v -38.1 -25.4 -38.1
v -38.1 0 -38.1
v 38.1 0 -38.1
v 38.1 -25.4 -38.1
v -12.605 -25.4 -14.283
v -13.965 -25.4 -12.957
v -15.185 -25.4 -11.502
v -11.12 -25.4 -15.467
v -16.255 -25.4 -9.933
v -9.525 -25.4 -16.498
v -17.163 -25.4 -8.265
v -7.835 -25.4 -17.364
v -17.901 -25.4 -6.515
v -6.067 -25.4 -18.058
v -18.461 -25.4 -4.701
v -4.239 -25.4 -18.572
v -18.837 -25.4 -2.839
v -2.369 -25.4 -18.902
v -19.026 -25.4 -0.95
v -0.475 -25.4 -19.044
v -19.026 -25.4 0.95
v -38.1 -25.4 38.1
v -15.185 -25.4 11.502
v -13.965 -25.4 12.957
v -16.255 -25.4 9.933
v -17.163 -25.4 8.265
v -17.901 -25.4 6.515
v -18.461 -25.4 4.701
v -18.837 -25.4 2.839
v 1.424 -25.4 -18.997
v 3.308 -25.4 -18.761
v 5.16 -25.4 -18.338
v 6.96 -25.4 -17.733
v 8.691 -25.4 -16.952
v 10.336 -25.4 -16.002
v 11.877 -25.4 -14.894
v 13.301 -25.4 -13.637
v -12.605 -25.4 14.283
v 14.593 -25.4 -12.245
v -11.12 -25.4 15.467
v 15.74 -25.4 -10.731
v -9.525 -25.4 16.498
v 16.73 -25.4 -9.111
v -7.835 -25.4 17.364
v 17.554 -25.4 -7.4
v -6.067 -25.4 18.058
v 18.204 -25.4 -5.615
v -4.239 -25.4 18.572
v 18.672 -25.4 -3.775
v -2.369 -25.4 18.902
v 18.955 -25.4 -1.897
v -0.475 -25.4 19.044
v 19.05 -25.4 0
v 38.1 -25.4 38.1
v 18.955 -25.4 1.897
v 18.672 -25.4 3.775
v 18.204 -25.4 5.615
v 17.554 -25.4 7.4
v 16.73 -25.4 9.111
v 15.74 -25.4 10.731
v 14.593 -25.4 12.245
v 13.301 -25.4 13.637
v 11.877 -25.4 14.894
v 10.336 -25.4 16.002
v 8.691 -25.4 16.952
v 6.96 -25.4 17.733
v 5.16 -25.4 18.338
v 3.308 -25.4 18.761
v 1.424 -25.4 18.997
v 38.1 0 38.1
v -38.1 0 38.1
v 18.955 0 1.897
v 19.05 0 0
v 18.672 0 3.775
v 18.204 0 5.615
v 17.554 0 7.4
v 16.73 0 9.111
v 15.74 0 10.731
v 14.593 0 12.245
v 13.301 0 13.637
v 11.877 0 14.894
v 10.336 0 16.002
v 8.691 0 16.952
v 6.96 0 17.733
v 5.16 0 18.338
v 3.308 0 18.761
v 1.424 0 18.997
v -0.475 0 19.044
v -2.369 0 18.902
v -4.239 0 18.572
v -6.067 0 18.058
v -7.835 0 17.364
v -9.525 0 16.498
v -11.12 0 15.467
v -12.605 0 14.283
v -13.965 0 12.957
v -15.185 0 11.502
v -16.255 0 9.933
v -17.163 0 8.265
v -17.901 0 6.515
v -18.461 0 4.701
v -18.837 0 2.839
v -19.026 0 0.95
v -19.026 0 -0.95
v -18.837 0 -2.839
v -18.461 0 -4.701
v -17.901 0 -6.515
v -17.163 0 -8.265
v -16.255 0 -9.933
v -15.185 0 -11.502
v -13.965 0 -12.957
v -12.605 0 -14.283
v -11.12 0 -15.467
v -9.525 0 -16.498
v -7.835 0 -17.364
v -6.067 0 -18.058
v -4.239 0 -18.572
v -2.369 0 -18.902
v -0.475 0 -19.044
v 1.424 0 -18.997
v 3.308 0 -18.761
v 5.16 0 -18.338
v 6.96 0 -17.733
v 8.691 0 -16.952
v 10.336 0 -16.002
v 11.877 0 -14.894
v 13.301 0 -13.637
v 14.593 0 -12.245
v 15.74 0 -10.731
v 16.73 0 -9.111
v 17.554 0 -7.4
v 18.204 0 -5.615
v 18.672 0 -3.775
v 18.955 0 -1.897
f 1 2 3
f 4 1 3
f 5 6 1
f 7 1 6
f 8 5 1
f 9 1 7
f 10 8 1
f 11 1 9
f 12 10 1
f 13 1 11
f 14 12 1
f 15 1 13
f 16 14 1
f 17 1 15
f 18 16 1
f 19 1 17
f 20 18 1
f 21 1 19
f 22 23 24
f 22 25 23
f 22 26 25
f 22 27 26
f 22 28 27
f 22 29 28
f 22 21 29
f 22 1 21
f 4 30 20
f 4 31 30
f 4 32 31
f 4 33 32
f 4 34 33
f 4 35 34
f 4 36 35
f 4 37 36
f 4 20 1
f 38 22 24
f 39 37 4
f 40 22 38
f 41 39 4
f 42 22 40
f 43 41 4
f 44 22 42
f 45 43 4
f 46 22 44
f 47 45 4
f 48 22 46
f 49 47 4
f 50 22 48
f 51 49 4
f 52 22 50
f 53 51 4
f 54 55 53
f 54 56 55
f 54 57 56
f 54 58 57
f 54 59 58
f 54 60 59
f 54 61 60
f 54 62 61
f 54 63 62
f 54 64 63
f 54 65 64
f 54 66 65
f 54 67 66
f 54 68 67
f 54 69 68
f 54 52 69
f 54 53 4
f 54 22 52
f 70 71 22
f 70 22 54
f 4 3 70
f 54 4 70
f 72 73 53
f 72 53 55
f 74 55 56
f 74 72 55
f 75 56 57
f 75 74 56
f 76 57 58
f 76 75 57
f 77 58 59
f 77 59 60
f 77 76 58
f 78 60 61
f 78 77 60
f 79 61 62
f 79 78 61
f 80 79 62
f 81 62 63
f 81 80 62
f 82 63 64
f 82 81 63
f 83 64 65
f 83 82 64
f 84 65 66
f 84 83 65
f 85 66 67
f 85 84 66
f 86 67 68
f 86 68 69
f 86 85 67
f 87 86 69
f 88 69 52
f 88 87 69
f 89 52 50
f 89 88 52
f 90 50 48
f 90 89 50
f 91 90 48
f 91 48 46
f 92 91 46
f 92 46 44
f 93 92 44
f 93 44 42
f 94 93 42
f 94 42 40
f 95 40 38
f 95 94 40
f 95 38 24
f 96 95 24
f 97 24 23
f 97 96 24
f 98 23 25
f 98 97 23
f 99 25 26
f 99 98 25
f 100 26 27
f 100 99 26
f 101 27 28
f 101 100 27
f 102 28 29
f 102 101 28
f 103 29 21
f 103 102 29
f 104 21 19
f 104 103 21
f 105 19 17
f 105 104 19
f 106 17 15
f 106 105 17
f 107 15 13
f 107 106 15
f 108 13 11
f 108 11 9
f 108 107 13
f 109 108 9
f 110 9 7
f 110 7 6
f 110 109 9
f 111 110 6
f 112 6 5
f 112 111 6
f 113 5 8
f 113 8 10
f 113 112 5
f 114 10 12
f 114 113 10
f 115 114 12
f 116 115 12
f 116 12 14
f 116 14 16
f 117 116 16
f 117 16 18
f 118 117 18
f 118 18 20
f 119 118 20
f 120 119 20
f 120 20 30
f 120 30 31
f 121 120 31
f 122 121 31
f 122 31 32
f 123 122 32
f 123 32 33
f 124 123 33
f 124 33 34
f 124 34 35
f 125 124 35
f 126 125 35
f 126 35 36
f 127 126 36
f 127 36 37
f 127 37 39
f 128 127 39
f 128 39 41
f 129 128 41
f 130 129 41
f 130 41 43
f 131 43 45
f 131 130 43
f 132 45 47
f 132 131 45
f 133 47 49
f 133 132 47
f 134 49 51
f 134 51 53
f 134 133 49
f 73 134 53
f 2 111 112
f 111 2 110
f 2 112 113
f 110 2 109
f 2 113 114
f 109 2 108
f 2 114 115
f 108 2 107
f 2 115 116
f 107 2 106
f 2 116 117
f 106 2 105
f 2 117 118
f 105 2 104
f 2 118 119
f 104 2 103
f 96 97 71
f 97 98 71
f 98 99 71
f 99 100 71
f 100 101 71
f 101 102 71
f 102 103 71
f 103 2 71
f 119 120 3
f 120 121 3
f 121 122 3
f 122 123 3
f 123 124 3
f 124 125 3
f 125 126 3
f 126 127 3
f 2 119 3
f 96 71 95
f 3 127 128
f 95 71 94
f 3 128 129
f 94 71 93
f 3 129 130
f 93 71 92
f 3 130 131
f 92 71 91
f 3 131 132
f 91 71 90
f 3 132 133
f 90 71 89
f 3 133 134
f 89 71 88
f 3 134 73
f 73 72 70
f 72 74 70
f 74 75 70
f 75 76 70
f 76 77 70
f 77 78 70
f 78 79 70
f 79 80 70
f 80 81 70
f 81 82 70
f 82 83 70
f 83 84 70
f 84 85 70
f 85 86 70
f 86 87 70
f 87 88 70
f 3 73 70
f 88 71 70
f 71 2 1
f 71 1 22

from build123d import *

# Parameters (mm, degrees)
F0_W     = 76.2
F0_H     = 76.2
F0_R     = 19.05
F1_DEPTH = 25.4


# Not quite as in the source:
# - the program builds the solid bodies; features that only make, move or delete a surface that nothing else refers to are left out


with BuildPart() as f1:
    # F0 (on Front) → F1 (new body)
    with BuildSketch(Plane.XZ):
        Rectangle(F0_W, F0_H)
        Circle(F0_R, mode=Mode.SUBTRACT)
    extrude(amount=F1_DEPTH)


solid = f1.part
